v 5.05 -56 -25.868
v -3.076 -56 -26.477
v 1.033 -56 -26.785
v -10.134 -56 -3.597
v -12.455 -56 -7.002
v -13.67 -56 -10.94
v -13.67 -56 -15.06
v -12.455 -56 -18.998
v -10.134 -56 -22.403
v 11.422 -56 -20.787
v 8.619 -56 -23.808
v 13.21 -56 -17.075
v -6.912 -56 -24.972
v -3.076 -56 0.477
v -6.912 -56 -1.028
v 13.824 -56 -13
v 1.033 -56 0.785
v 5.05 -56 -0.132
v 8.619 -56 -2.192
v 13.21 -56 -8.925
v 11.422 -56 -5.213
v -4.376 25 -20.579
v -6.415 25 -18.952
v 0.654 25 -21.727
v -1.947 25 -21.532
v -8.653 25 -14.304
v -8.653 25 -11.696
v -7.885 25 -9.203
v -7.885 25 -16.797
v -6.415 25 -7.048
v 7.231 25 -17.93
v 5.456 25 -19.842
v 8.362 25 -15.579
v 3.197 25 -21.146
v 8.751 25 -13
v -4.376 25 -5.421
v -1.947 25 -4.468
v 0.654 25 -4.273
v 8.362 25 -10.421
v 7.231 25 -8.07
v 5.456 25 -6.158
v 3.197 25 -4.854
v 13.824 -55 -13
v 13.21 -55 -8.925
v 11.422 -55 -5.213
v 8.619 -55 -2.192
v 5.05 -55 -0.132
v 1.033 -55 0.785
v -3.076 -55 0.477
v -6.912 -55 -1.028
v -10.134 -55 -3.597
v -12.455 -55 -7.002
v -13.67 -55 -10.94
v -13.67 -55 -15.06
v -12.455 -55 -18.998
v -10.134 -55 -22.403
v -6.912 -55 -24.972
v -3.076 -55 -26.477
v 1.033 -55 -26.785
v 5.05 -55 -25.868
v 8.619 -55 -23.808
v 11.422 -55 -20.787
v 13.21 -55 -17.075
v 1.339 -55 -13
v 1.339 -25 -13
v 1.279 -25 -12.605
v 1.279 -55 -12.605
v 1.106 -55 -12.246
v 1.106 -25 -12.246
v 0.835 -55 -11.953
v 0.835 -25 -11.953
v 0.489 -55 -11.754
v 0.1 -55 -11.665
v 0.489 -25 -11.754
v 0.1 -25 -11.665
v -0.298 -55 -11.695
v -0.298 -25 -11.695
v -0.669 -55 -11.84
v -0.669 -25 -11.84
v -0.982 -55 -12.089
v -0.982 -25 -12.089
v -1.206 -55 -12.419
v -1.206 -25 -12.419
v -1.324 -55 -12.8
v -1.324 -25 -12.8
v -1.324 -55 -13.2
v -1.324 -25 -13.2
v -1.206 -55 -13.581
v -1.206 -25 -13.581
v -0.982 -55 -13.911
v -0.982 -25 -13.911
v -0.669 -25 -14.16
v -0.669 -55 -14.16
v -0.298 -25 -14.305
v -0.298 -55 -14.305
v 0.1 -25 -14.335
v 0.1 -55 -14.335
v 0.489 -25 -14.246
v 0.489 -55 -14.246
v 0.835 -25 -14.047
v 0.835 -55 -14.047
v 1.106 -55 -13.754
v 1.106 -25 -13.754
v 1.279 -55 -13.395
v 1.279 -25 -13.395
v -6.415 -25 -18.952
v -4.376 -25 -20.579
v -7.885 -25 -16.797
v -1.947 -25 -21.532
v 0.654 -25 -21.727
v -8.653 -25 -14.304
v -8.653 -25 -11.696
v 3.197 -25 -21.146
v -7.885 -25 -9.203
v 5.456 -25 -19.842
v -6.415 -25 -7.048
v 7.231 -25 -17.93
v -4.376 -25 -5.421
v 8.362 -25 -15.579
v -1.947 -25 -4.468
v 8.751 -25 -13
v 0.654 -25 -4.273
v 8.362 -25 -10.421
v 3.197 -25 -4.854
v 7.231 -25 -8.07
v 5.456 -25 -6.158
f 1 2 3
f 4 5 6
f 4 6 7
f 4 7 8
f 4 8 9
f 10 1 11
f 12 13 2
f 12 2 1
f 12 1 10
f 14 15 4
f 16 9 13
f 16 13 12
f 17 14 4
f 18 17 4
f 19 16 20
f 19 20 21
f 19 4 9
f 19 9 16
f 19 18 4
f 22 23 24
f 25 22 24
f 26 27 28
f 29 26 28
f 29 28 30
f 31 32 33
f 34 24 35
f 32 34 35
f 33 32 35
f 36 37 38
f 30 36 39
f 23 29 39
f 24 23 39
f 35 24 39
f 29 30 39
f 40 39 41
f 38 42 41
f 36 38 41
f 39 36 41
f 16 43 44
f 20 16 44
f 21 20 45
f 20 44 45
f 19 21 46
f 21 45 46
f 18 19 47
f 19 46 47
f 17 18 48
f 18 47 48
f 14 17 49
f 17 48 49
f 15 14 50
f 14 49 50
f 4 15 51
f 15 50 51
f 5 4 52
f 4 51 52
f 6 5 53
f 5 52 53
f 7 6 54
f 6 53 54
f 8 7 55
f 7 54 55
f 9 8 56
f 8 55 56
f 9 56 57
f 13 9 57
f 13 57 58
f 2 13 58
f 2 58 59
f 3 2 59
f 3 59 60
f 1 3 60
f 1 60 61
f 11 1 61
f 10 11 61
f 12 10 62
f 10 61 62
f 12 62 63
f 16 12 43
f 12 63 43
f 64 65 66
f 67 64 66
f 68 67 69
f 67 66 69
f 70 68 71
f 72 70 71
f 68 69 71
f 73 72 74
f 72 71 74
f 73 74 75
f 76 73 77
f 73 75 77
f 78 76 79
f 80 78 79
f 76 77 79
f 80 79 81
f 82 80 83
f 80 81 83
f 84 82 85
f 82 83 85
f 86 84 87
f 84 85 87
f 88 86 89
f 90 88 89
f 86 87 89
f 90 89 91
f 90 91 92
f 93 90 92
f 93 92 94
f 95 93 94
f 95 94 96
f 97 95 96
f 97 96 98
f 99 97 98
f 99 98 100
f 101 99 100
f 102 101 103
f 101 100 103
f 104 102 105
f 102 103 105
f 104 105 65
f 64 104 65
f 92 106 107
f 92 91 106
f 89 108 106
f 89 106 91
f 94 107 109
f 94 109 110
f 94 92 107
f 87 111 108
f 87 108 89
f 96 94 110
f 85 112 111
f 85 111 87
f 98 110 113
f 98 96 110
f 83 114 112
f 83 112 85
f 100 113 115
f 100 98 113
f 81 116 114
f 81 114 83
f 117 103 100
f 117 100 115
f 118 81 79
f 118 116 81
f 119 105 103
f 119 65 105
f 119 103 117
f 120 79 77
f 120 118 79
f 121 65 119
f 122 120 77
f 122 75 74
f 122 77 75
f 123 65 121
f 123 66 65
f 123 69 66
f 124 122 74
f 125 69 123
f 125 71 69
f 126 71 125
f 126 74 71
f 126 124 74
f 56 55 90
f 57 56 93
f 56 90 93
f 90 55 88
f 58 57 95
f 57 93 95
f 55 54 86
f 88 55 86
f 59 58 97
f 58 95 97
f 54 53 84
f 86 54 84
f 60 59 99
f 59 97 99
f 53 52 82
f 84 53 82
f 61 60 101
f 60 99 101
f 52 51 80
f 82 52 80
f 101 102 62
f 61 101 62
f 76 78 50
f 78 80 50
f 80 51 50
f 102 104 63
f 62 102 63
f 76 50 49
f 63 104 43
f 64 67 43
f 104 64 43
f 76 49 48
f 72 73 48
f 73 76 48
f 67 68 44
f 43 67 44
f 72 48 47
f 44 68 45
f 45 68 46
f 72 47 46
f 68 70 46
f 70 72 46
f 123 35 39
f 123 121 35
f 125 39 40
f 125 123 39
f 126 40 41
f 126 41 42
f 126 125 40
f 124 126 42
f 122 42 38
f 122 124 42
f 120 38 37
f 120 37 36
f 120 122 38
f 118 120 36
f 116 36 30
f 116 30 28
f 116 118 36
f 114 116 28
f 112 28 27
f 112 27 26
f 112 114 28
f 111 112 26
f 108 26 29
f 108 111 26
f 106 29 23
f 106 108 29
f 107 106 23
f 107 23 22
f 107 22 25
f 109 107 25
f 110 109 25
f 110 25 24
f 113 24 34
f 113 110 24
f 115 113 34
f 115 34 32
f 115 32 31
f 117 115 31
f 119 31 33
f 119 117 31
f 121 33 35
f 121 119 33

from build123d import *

# Parameters (mm, degrees)
SKETCH003_R  = 8.751236
PAD002_DEPTH = 25
SKETCH004_R  = 1.338937
PAD003_DEPTH = 30
SKETCH005_R  = 13.823981
PAD004_DEPTH = 1


with BuildPart() as part:
    # Sketch003 → Pad002 (new body, symmetric)
    with BuildSketch(Plane.XZ):
        Circle(SKETCH003_R)
    extrude(amount=PAD002_DEPTH, both=True)

    # Sketch004 (on Face3 of Pad002) → Pad003 (join)
    with BuildSketch(Plane.XZ.offset(25)):
        Circle(SKETCH004_R)
    extrude(amount=PAD003_DEPTH)

    # Sketch005 (on Face5 of Pad003) → Pad004 (join)
    with BuildSketch(Plane.XZ.offset(55)):
        Circle(SKETCH005_R)
    extrude(amount=PAD004_DEPTH)


with BuildPart() as part_1:
    # Body002 placement: moved
    add(part.part.moved(Location((0, 0, -13))))


solid = part_1.part
